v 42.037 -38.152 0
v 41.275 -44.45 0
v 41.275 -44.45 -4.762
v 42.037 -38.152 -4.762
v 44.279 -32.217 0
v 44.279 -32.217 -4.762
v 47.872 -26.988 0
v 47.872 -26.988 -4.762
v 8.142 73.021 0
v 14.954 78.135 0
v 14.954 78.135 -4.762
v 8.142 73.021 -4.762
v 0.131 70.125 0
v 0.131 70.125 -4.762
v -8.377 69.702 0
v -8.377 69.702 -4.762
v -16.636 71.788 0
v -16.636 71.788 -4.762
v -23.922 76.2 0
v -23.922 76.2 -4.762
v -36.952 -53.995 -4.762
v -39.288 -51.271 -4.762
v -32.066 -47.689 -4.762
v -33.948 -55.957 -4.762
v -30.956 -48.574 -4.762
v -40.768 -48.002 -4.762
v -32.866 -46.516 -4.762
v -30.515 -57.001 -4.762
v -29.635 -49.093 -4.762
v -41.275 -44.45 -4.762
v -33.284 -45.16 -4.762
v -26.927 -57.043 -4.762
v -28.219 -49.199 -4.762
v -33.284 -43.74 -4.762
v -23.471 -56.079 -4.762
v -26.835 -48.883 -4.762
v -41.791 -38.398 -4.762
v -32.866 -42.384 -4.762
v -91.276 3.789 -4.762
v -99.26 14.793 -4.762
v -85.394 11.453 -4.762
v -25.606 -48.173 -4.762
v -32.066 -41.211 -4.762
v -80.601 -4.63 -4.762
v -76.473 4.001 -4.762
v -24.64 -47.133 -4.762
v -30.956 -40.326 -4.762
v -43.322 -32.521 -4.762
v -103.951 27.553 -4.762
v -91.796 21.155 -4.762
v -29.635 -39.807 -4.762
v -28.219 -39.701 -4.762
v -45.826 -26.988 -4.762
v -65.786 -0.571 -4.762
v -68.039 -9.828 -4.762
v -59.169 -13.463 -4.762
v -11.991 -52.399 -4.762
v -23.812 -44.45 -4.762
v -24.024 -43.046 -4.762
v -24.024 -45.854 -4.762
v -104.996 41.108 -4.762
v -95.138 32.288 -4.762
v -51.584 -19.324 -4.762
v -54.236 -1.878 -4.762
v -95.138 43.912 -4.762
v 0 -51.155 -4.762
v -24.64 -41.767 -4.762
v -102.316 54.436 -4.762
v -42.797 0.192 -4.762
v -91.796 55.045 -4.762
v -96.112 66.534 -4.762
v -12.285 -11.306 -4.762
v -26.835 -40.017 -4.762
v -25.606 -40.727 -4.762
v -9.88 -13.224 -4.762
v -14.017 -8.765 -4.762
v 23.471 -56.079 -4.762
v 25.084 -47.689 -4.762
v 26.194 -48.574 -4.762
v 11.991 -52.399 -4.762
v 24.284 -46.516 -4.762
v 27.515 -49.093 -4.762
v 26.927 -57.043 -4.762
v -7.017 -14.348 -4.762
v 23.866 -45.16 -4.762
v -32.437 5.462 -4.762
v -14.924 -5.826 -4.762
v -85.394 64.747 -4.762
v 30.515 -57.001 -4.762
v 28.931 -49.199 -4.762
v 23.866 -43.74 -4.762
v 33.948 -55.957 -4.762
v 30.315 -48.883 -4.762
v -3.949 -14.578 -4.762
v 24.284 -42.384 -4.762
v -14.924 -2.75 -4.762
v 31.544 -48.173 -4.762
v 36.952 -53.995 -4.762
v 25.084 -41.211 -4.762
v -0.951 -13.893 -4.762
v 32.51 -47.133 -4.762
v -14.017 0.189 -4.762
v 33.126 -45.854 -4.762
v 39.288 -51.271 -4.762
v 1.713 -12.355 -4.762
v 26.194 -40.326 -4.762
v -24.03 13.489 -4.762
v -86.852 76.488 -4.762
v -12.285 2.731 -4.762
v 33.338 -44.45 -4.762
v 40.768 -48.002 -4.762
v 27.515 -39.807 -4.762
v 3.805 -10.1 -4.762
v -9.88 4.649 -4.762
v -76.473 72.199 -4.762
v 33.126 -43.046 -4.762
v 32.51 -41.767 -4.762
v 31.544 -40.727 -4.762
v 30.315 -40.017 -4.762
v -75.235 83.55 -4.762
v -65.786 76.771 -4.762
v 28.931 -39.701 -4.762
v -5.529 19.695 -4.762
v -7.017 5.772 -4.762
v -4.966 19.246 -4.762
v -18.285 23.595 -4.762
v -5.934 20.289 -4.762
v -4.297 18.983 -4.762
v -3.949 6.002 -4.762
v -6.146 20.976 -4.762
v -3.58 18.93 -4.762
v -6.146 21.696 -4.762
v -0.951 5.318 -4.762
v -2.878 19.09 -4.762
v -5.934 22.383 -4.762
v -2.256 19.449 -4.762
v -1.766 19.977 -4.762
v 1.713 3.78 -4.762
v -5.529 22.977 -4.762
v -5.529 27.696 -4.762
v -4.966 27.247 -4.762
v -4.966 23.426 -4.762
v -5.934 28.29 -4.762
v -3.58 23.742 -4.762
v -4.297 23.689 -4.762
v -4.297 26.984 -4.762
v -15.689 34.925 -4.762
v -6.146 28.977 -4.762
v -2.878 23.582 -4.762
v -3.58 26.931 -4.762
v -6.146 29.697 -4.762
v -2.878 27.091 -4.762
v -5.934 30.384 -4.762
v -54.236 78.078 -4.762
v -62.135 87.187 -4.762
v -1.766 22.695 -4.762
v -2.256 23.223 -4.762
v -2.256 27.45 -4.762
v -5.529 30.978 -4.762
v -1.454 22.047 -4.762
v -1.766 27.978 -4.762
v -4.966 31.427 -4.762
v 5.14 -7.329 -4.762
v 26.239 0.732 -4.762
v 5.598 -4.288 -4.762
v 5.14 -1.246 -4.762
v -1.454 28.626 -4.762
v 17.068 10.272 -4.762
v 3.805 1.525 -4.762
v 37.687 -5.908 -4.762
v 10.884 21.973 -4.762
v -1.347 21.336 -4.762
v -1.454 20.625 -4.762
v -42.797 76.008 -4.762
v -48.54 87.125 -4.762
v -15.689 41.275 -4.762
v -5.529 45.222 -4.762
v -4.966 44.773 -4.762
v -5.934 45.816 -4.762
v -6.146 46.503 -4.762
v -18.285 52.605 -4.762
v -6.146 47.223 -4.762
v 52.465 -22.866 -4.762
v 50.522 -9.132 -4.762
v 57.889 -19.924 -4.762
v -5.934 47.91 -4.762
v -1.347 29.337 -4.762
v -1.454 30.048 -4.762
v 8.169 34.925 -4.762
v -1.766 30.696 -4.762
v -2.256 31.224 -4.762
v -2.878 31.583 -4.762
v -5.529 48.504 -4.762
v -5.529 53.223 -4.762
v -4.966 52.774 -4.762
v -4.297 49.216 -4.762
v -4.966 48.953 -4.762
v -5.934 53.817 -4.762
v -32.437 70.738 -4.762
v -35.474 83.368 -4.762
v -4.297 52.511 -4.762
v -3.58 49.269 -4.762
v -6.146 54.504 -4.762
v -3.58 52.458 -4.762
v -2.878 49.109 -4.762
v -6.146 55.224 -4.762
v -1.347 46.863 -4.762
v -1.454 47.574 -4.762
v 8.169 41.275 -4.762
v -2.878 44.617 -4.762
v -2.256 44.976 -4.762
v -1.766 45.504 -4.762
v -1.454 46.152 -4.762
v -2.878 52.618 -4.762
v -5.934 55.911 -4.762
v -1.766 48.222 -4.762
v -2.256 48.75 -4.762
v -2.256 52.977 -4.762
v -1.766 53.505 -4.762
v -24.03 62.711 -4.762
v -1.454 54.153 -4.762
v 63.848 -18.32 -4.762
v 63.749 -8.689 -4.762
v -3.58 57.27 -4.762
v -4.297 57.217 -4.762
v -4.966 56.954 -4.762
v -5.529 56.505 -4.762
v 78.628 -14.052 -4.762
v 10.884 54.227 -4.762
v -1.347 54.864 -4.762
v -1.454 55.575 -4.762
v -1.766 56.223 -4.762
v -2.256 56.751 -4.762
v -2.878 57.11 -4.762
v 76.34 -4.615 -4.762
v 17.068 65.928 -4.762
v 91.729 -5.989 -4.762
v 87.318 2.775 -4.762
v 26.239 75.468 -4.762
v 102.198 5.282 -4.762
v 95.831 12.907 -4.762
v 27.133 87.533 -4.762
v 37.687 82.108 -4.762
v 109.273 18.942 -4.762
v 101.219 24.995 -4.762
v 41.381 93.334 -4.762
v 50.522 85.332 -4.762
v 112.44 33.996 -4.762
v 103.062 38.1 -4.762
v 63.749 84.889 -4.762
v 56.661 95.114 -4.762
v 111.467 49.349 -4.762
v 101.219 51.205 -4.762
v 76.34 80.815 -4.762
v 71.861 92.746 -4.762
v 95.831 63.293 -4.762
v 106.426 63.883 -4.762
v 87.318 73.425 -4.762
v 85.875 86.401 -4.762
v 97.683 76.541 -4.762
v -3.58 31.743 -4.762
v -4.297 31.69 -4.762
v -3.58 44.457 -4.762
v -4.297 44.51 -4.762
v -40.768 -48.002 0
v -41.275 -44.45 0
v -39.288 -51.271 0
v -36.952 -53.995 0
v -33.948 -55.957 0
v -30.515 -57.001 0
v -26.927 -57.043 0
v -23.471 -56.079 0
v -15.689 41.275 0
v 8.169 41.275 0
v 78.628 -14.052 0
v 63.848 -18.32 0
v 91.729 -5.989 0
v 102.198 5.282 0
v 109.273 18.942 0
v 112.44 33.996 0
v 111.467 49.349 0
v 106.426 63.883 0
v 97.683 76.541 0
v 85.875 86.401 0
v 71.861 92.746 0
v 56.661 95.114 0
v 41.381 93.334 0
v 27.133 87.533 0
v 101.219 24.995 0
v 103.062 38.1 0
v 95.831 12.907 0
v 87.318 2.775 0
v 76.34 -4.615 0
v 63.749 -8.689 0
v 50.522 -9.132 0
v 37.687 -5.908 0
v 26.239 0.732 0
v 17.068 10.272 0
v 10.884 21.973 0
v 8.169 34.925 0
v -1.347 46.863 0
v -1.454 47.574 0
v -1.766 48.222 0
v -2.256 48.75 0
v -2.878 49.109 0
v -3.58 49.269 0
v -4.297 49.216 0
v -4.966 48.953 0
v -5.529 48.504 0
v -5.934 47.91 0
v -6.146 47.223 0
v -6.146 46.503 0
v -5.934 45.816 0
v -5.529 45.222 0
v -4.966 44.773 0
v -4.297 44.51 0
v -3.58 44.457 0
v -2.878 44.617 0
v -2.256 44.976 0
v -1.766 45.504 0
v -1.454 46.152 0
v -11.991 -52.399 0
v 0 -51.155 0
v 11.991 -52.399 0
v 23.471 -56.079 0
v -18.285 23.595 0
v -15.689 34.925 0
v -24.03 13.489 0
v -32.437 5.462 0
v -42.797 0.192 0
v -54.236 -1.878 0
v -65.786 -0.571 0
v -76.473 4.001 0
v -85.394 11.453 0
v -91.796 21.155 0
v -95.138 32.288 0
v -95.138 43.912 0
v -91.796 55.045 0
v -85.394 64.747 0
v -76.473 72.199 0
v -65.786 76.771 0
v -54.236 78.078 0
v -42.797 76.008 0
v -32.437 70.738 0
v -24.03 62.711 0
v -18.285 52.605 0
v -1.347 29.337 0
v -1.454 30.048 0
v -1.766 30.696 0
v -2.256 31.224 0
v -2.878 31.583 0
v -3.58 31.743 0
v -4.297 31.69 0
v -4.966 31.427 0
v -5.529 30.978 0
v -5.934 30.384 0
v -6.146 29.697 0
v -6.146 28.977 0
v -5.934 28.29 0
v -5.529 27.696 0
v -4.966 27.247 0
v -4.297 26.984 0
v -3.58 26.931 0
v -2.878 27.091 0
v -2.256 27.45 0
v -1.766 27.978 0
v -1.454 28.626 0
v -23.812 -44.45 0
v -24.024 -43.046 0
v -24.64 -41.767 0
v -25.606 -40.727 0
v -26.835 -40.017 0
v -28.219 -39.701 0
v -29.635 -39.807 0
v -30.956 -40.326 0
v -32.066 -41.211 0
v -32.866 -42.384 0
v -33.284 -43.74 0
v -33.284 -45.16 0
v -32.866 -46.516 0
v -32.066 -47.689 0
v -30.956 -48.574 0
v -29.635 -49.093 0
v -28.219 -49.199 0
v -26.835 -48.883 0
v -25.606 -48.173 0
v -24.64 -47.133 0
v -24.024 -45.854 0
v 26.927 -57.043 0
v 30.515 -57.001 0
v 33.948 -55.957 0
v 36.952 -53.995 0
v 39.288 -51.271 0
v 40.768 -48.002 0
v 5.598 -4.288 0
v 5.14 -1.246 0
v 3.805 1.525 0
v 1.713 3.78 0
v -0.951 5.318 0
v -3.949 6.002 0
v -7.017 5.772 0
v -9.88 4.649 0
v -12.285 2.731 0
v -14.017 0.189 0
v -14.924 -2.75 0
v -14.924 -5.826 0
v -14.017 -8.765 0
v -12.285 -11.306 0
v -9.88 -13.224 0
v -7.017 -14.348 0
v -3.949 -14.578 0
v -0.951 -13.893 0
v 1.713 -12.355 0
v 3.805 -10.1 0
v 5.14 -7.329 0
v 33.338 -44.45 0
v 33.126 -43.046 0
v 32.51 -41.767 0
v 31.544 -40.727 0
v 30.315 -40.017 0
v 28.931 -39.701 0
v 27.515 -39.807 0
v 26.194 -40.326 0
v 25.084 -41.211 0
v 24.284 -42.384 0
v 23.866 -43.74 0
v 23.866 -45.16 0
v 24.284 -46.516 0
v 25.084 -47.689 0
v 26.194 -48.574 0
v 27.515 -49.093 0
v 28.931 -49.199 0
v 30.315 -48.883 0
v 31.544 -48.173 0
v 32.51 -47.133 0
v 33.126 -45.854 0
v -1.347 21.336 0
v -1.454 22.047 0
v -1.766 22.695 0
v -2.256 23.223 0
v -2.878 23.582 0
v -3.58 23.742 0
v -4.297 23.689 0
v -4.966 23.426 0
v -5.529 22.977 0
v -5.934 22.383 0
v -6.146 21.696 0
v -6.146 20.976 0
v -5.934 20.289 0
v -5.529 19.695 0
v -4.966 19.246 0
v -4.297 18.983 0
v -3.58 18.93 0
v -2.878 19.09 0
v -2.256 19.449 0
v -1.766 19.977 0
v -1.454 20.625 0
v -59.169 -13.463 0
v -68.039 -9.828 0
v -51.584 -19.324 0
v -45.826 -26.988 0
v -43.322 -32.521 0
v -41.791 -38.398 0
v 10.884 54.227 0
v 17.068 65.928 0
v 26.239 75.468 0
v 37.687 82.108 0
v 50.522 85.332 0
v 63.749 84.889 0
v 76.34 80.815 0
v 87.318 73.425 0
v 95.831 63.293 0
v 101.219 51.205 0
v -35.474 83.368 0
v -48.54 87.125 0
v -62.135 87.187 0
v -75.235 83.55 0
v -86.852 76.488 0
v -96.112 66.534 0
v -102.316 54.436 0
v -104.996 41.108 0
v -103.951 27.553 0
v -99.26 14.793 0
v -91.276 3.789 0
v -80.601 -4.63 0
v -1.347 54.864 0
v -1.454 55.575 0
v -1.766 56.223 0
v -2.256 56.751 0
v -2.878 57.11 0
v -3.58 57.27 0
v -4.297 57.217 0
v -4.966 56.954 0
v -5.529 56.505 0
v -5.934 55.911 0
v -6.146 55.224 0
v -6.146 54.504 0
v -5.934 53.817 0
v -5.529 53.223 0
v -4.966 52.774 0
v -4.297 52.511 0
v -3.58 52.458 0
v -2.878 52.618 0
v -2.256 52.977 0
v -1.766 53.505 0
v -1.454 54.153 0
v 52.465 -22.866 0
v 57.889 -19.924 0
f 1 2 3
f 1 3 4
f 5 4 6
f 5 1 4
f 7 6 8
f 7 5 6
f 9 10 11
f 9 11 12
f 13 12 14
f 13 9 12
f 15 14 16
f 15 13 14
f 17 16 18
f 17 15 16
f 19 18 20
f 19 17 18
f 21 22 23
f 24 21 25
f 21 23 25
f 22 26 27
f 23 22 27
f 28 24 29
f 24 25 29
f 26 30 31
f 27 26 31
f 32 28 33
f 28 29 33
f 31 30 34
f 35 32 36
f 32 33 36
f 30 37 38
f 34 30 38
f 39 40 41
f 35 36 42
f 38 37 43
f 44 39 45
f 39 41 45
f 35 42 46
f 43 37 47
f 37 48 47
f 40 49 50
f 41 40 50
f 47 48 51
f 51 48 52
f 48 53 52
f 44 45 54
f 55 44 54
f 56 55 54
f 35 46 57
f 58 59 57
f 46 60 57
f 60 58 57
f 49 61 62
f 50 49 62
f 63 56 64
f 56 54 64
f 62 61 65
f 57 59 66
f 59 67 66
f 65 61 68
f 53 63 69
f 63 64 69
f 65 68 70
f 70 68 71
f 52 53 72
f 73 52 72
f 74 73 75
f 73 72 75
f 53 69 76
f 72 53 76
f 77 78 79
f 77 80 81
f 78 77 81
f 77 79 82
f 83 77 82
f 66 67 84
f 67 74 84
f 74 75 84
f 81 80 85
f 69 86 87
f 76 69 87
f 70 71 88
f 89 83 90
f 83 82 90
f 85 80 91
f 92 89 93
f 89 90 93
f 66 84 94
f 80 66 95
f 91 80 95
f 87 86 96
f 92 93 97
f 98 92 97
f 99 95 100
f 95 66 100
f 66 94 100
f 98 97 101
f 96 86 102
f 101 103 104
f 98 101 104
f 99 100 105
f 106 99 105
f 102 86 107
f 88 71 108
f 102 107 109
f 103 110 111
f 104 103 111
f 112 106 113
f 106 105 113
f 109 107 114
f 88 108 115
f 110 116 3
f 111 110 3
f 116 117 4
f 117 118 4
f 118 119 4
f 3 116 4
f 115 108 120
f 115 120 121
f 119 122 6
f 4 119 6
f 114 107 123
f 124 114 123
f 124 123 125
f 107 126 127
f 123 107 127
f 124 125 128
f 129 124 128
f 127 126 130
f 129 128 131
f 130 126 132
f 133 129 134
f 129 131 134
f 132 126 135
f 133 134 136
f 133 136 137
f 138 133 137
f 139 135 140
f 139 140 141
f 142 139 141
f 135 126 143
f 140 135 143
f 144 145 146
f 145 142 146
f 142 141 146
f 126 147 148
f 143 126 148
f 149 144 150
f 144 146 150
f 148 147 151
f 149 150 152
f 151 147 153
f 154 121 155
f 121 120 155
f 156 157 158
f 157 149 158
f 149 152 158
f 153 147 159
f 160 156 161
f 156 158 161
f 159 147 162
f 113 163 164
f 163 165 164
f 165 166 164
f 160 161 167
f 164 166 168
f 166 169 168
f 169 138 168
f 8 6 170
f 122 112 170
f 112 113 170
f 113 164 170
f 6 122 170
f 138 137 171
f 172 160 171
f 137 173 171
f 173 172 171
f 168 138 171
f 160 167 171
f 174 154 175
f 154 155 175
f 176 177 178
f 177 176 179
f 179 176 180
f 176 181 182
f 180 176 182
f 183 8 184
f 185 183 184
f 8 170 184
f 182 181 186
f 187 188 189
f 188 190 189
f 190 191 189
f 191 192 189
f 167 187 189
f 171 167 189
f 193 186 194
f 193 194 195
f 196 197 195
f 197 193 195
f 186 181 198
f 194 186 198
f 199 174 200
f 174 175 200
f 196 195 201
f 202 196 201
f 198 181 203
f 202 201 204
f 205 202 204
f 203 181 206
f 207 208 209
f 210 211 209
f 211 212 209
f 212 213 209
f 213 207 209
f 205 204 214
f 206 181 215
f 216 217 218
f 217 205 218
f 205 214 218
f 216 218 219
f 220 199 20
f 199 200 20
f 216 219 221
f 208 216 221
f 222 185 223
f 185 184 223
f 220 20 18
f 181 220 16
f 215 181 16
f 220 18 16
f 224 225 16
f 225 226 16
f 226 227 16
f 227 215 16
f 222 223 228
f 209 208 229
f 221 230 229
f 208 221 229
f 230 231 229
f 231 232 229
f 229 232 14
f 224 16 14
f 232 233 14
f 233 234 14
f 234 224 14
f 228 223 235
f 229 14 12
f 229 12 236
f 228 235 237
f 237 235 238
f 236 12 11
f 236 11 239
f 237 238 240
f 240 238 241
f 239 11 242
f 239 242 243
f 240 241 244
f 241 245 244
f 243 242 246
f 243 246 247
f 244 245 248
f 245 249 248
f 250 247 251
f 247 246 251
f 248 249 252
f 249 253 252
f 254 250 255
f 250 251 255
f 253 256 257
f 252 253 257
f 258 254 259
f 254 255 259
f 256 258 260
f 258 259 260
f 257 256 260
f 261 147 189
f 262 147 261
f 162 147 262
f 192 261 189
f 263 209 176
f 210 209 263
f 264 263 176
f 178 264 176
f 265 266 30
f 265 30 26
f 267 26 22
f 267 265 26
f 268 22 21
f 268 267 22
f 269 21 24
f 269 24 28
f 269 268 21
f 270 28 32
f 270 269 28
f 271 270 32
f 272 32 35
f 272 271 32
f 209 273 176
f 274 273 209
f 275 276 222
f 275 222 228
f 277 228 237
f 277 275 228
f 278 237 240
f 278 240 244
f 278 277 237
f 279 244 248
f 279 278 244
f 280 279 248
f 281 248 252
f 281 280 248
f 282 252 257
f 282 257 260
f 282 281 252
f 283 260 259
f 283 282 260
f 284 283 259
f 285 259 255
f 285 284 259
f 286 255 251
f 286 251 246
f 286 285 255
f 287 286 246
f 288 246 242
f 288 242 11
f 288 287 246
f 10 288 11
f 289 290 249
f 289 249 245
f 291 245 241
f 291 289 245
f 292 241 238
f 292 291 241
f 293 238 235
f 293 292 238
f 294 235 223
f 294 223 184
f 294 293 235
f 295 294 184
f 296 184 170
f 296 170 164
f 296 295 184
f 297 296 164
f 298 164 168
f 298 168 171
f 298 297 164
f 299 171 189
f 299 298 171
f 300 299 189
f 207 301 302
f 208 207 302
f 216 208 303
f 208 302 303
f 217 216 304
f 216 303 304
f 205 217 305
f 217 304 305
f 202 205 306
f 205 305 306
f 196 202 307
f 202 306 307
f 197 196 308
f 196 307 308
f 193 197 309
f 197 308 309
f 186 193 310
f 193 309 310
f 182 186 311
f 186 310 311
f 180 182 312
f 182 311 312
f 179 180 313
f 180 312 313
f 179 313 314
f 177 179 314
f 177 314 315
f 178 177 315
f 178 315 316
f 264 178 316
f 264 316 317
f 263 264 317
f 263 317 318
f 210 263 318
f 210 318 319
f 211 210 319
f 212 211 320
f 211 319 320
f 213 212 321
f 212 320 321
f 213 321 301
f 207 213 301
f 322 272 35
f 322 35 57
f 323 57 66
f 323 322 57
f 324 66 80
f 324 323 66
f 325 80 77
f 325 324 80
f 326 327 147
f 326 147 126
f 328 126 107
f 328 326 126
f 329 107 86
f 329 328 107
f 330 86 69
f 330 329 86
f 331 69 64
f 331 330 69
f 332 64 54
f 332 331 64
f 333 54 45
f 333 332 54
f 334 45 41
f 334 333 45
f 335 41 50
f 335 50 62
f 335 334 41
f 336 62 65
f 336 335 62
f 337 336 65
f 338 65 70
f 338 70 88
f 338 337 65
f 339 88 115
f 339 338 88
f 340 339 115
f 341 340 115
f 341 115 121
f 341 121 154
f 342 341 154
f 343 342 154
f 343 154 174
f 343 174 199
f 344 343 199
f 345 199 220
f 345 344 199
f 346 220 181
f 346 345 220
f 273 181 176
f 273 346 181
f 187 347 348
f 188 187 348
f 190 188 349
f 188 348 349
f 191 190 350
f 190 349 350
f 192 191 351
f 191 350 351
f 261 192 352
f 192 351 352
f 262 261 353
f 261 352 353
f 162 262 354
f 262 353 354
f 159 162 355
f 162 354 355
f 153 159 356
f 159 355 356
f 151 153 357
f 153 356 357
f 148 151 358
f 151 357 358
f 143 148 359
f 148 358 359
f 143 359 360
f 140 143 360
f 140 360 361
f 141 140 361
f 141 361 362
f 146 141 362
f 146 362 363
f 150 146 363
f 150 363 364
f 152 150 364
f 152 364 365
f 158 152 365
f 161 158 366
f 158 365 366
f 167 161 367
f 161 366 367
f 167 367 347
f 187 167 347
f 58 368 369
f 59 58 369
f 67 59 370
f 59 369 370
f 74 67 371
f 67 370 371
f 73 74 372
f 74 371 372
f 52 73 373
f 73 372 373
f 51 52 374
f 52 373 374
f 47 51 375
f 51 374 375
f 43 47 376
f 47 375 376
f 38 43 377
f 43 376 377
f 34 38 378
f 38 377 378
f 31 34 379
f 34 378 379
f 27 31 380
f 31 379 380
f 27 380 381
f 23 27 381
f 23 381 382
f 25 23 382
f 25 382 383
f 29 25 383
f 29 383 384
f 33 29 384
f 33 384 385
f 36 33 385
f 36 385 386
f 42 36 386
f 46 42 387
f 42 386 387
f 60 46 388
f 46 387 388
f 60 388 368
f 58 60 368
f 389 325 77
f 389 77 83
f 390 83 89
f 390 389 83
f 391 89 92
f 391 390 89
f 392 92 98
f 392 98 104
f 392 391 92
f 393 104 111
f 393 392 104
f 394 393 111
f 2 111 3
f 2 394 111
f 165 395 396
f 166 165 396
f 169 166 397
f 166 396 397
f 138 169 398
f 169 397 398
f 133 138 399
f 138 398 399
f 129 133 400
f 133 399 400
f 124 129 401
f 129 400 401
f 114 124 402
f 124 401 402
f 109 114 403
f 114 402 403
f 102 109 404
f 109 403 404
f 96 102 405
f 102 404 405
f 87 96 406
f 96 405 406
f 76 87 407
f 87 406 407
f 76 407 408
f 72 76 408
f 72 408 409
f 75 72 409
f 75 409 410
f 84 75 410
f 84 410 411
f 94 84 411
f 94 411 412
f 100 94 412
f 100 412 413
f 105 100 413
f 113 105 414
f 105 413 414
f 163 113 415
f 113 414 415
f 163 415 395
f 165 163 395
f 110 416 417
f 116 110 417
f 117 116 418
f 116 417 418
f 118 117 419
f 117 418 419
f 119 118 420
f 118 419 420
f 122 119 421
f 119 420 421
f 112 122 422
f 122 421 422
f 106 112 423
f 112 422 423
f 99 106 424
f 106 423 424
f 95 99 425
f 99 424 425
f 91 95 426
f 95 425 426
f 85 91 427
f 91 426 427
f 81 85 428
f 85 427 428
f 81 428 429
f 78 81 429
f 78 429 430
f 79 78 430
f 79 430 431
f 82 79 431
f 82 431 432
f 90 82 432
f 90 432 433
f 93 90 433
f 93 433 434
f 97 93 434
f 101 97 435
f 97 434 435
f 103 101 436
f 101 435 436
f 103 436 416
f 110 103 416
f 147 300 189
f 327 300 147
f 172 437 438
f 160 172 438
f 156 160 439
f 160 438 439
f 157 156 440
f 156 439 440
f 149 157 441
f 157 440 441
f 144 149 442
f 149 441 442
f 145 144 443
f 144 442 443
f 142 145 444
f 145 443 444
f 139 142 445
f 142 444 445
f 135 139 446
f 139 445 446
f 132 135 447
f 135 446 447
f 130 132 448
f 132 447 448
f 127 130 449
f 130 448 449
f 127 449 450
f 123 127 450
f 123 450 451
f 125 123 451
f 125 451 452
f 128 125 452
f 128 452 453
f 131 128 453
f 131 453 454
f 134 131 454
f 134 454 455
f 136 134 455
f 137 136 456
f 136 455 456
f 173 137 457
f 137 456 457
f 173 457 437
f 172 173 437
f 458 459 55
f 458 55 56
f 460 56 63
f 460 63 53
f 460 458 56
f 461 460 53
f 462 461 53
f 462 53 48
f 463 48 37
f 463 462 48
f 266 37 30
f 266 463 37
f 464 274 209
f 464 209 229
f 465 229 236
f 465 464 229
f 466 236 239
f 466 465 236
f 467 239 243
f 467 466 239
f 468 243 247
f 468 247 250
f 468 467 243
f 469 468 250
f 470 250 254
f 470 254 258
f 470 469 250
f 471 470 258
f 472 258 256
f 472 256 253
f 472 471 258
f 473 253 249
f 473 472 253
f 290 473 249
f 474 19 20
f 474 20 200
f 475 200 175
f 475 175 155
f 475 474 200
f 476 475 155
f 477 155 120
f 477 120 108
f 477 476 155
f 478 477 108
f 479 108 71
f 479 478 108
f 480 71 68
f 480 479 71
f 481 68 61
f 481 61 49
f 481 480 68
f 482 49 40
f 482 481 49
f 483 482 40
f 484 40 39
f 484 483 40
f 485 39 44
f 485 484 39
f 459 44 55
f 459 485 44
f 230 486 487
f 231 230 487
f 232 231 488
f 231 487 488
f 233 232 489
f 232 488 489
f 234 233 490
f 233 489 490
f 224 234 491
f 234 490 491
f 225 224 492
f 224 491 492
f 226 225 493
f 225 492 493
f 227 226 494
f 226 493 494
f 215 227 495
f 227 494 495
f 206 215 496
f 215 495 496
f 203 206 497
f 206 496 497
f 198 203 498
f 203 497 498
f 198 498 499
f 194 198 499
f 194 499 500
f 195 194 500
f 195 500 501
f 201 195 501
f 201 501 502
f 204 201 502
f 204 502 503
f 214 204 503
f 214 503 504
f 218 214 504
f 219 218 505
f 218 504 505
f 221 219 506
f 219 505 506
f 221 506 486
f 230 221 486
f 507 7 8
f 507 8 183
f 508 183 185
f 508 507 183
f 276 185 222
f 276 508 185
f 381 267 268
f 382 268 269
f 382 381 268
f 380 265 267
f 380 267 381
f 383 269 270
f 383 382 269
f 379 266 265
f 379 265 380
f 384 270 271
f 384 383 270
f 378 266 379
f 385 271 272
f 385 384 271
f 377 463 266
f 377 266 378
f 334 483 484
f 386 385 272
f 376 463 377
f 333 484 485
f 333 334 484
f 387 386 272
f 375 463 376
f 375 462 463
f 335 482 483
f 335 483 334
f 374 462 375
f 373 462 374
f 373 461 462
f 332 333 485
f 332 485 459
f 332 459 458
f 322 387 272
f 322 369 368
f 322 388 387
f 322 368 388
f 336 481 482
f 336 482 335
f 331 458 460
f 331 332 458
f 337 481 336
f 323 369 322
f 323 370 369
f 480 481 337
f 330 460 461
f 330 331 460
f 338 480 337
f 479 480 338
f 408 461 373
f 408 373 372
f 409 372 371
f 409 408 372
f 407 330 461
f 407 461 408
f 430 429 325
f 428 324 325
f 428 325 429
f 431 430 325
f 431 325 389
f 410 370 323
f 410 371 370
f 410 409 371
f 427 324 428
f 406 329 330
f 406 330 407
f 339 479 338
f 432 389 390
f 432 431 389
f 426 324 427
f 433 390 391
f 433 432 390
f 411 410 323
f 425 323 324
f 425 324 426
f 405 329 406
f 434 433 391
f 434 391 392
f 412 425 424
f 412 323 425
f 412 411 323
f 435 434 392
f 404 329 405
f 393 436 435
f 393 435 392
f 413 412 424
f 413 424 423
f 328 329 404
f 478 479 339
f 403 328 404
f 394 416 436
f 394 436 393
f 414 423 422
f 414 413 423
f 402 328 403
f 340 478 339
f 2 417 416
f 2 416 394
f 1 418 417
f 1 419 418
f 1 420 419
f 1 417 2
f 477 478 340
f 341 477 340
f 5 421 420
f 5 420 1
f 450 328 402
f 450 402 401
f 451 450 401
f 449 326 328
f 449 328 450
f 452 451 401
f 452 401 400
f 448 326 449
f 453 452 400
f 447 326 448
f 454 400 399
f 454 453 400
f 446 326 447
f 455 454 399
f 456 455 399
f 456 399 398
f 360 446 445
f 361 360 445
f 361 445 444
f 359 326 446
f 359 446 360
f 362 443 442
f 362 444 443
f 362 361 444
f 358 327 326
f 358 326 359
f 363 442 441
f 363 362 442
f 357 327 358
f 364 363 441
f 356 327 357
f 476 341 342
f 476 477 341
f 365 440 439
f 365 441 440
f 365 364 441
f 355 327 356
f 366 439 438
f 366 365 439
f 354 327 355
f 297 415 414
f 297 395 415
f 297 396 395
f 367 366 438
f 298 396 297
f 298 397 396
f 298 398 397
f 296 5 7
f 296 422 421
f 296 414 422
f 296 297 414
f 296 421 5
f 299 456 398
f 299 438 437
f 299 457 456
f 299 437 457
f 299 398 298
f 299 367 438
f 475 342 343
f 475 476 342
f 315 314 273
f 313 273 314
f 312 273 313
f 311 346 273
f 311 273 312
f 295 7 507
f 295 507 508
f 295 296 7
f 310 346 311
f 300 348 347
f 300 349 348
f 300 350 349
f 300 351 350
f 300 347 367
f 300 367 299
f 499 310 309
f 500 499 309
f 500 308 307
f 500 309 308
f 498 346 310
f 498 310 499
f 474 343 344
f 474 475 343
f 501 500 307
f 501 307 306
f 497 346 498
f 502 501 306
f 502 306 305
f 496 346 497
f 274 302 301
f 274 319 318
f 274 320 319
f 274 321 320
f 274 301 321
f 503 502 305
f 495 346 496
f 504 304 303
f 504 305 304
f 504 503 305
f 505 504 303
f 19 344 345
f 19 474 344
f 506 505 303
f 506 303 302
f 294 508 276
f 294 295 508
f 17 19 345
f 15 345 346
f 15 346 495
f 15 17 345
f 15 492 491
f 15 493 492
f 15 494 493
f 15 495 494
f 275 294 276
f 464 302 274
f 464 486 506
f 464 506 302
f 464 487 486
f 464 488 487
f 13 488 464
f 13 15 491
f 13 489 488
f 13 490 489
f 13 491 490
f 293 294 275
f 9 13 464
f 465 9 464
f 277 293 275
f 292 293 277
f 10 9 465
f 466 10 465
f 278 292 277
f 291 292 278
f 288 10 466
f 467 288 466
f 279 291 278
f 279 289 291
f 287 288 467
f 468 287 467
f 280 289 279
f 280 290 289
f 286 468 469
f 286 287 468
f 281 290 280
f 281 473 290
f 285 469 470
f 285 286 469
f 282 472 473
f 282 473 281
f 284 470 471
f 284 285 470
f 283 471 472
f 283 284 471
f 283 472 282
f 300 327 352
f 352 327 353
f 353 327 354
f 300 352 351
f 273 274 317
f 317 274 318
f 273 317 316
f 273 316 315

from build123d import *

# Parameters (mm, degrees)
F0_R     = 4.7625
F0_R_2   = 10.31875
F0_R_3   = 2.413
F1_DEPTH = 4.7625


with BuildPart() as f1:
    # F0 (on Top) → F1 (new body)
    with BuildSketch(Plane.XY):
        with BuildLine():
            ThreePointArc((41.275, -44.45), (42.979239, -35.116466), (47.87201, -26.9875))
            Line((47.87201, -26.9875), (-45.826281, -26.9875))
            ThreePointArc((-45.826281, -26.9875), (-42.431513, -35.42707), (-41.275, -44.45))
            ThreePointArc((-41.275, -44.45), (-35.519907, -55.082886), (-23.470548, -56.07904))
            ThreePointArc((-23.470548, -56.07904), (0, -51.154707), (23.470548, -56.07904))
            ThreePointArc((23.470548, -56.07904), (35.519907, -55.082886), (41.275, -44.45))
        make_face()
        with Locations((-28.575, -44.45)):
            Circle(F0_R, mode=Mode.SUBTRACT)
        with Locations((28.575, -44.45)):
            Circle(F0_R, mode=Mode.SUBTRACT)
        with BuildLine():
            ThreePointArc((63.848057, -18.319856), (106.425851, 63.883136), (14.954093, 78.135084))
            ThreePointArc((14.954093, 78.135084), (-4.10718, 69.597202), (-23.922089, 76.2))
            ThreePointArc((-23.922089, 76.2), (-99.630791, 60.698924), (-68.038523, -9.827805))
            ThreePointArc((-68.038523, -9.827805), (-55.179287, -16.138345), (-45.826281, -26.9875))
            Line((-45.826281, -26.9875), (47.87201, -26.9875))
            ThreePointArc((47.87201, -26.9875), (55.090906, -21.236035), (63.848057, -18.319856))
        make_face()
        with Locations((-4.720613, -4.287676)):
            Circle(F0_R_2, mode=Mode.SUBTRACT)
        with Locations((-3.759988, 21.336)):
            Circle(F0_R_3, mode=Mode.SUBTRACT)
        with Locations((-3.759988, 29.337)):
            Circle(F0_R_3, mode=Mode.SUBTRACT)
        with Locations((-3.759988, 46.863)):
            Circle(F0_R_3, mode=Mode.SUBTRACT)
        with Locations((-3.759988, 54.864)):
            Circle(F0_R_3, mode=Mode.SUBTRACT)
        with BuildLine():
            ThreePointArc((-15.688707, 34.925), (-95.5625, 38.1), (-15.688707, 41.275))
            Line((-15.688707, 41.275), (8.168731, 41.275))
            ThreePointArc((8.168731, 41.275), (57.150888, 85.573435), (103.0625, 38.1))
            ThreePointArc((103.0625, 38.1), (57.150888, -9.373435), (8.168731, 34.925))
            Line((8.168731, 34.925), (-15.688707, 34.925))
        make_face(mode=Mode.SUBTRACT)
    extrude(amount=-F1_DEPTH)


solid = f1.part
